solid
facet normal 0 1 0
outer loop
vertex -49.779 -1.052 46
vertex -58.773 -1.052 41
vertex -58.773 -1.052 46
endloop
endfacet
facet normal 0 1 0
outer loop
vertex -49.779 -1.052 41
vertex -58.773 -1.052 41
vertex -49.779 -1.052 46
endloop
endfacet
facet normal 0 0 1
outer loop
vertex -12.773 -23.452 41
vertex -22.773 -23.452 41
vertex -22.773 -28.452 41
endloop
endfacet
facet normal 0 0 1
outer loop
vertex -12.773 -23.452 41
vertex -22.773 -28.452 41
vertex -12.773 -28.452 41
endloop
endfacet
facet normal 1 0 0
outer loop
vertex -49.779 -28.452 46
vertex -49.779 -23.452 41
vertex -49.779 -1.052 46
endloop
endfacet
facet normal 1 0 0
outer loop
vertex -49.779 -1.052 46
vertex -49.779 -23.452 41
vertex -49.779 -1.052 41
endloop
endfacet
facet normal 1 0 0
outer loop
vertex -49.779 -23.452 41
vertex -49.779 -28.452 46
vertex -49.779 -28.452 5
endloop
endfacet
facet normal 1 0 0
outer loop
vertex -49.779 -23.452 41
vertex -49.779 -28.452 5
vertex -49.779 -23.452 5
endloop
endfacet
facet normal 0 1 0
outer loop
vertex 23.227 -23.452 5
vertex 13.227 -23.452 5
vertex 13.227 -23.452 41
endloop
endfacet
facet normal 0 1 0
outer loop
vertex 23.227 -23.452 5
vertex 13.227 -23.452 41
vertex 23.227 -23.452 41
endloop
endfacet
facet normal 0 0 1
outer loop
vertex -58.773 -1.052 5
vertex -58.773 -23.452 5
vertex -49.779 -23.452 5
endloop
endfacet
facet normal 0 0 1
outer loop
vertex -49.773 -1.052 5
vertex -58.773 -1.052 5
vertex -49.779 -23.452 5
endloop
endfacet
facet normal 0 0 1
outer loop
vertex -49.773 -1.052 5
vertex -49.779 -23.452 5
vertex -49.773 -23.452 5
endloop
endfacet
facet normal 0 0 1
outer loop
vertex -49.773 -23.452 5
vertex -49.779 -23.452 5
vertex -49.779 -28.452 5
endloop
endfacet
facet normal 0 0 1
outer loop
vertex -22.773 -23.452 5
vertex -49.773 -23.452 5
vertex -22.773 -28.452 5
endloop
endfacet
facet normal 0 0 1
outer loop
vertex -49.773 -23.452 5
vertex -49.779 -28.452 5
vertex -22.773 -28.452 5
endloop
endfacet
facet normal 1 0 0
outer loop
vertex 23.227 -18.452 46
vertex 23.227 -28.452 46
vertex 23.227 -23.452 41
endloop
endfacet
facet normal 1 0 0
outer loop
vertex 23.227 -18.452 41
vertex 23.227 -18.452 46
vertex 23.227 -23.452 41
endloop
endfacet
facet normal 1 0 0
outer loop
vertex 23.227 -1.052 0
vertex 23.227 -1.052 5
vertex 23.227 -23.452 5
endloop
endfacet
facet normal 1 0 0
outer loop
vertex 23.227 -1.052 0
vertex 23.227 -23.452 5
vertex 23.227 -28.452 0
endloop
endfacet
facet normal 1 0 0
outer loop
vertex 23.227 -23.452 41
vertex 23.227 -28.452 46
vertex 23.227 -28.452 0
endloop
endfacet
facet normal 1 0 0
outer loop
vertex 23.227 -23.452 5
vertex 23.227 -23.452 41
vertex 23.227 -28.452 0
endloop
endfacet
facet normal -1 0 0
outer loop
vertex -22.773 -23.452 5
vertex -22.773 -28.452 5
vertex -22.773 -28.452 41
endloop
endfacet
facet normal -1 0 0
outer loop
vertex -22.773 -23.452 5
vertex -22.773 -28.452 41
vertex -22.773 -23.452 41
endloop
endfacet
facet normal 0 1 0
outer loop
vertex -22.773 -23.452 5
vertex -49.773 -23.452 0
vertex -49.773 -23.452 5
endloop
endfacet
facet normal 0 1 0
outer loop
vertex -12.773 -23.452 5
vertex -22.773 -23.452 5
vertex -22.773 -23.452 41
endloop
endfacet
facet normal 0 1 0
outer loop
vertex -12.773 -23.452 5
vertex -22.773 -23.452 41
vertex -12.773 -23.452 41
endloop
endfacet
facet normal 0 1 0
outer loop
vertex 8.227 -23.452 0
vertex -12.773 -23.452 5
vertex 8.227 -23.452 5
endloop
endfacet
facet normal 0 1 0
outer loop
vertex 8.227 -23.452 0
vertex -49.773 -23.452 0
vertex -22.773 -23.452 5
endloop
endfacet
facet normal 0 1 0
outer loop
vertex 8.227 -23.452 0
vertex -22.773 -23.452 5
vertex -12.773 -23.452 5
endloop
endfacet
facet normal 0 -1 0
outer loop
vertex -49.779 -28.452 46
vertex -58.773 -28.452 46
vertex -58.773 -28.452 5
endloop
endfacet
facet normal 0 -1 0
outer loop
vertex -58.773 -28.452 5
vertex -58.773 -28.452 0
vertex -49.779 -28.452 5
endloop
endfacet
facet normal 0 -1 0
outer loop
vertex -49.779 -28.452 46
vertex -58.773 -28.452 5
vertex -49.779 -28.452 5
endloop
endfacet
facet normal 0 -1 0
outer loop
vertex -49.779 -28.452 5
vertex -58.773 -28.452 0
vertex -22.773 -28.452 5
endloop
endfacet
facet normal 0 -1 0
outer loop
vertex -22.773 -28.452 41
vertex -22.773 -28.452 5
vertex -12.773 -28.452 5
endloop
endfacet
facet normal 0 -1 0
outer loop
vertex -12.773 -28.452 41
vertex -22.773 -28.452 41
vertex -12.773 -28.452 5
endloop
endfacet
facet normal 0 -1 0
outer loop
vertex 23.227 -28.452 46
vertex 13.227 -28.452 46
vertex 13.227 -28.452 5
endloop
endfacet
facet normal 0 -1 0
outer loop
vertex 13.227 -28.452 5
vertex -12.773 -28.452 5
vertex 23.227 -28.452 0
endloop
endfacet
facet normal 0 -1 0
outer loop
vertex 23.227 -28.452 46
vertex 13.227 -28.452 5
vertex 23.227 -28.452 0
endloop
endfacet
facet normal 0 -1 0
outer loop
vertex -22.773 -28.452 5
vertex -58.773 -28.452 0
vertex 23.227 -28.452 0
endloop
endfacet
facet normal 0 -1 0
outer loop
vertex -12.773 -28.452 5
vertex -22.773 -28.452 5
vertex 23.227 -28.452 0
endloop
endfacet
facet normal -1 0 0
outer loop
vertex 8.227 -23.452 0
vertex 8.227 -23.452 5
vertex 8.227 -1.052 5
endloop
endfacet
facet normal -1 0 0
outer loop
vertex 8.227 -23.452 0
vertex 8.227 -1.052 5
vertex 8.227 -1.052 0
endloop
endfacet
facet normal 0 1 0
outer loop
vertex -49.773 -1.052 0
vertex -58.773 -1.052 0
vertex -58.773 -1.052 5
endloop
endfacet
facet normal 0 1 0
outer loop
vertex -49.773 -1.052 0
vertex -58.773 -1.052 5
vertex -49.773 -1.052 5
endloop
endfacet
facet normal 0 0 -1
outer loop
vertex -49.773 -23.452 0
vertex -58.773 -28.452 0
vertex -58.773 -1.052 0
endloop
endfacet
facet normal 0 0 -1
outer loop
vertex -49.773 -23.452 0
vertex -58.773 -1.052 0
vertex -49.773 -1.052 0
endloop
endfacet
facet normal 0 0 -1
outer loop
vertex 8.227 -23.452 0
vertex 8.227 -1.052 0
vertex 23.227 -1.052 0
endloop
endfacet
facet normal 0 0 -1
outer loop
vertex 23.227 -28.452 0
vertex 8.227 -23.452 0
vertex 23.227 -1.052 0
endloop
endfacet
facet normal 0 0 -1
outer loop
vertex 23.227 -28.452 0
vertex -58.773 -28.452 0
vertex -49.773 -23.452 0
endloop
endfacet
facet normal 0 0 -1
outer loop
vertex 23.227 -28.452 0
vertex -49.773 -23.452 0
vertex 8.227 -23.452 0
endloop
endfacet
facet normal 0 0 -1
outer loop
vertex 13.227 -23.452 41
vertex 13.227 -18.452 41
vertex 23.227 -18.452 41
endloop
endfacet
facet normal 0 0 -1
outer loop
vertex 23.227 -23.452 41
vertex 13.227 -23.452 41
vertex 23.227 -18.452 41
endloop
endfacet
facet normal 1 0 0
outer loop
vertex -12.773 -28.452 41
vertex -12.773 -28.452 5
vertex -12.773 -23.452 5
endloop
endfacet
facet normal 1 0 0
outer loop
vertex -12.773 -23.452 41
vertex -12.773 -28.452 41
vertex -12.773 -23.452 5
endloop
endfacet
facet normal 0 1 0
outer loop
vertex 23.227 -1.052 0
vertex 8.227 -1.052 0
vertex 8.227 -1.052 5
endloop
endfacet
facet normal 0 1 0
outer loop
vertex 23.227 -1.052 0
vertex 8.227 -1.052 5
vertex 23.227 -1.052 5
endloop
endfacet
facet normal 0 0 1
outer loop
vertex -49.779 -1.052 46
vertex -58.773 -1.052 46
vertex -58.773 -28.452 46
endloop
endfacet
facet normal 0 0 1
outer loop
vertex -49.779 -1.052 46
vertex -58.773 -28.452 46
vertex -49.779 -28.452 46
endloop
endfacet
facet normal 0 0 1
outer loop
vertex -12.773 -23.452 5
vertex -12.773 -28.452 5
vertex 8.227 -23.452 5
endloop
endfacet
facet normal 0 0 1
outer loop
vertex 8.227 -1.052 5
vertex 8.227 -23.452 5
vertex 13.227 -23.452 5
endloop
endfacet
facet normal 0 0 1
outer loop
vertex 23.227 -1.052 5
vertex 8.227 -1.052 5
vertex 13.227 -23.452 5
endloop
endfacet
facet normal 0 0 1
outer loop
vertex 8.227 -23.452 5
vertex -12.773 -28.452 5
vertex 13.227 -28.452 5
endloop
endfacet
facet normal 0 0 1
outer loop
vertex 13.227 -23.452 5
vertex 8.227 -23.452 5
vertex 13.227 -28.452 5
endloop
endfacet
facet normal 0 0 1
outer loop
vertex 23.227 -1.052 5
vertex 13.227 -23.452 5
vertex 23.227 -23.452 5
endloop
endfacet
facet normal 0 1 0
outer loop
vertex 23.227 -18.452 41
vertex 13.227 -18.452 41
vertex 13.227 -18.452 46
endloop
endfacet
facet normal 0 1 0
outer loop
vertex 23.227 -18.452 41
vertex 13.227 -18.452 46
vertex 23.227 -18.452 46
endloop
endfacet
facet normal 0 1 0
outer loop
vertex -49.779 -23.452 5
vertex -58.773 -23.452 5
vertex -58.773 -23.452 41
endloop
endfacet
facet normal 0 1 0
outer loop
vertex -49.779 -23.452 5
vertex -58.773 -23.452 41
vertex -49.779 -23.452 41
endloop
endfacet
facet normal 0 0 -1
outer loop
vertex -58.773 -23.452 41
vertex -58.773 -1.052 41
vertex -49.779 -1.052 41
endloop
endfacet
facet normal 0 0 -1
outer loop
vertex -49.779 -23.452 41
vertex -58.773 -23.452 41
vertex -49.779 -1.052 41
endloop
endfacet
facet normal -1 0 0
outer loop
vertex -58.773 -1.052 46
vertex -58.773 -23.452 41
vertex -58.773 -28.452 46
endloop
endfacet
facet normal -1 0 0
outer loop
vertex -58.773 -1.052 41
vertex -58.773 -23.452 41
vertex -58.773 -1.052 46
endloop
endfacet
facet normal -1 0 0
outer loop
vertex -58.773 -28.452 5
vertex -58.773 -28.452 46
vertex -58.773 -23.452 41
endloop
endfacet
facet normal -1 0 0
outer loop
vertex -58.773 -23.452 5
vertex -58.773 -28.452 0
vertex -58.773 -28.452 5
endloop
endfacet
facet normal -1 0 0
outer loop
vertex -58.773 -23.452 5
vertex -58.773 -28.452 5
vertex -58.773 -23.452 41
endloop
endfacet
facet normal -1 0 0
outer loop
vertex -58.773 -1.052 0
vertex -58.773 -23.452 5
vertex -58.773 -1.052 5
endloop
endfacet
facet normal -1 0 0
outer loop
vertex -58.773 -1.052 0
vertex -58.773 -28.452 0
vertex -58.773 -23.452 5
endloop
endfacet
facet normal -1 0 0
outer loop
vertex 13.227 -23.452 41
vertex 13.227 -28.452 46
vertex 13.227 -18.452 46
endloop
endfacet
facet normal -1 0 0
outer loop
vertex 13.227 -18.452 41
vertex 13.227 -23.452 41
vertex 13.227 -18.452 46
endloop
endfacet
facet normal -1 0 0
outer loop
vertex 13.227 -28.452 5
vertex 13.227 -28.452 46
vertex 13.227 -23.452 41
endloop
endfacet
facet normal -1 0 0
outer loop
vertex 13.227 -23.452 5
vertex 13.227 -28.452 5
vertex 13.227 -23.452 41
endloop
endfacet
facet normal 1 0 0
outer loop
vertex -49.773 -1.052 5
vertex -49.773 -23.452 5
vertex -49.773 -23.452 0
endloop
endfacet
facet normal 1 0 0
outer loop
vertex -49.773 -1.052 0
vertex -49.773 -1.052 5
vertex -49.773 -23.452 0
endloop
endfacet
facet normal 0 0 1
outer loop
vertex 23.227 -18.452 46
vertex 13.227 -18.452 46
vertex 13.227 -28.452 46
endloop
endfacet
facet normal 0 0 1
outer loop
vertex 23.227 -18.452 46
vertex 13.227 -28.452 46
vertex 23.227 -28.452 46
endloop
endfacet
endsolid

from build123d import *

# Parameters (mm, degrees)
CROQUIS1_W              = 82
CROQUIS1_H              = 5
SALIENTE_EXTRUIR1_DEPTH = 5
CROQUIS2_W              = 15
CROQUIS2_H              = 5
CROQUIS2_W_2            = 9
SALIENTE_EXTRUIR2_DEPTH = 22.4
CROQUIS3_W              = 8.993517989
CROQUIS3_H              = 5
CROQUIS3_W_2            = 10
SALIENTE_EXTRUIR3_DEPTH = 36
CROQUIS4_W              = 8.993517989
CROQUIS4_H              = 27.4
CROQUIS4_W_2            = 10
CROQUIS4_H_2            = 10
SALIENTE_EXTRUIR4_DEPTH = 5


with BuildPart() as part:
    # Croquis1 → Saliente-Extruir1 (new body)
    with BuildSketch(Plane.XY):
        with Locations((-17.772529993, -25.951946472)):
            Rectangle(CROQUIS1_W, CROQUIS1_H)
    extrude(amount=SALIENTE_EXTRUIR1_DEPTH)

    # Croquis2 → Saliente-Extruir2 (add)
    with BuildSketch(Plane(origin=(0, -23.451946472, 0), x_dir=(1, 0, 0), z_dir=(0, 1, 0))):
        with Locations((15.727470007, -2.5)):
            Rectangle(CROQUIS2_W, CROQUIS2_H)
        with Locations((-54.272529993, -2.5)):
            Rectangle(CROQUIS2_W_2, CROQUIS2_H)
    extrude(amount=SALIENTE_EXTRUIR2_DEPTH)

    # Croquis3 → Saliente-Extruir3 (add)
    with BuildSketch(Plane.XY.offset(5)):
        with Locations((-54.275770999, -25.951946472)):
            Rectangle(CROQUIS3_W, CROQUIS3_H)
        with Locations((-17.772529993, -25.951946472)):
            Rectangle(CROQUIS3_W_2, CROQUIS3_H)
        with Locations((18.227470007, -25.951946472)):
            Rectangle(CROQUIS3_W_2, CROQUIS3_H)
    extrude(amount=SALIENTE_EXTRUIR3_DEPTH)

    # Croquis4 → Saliente-Extruir4 (add)
    with BuildSketch(Plane.XY.offset(41)):
        with Locations((-54.275770999, -14.751946472)):
            Rectangle(CROQUIS4_W, CROQUIS4_H)
        with Locations((18.227470007, -23.451946472)):
            Rectangle(CROQUIS4_W_2, CROQUIS4_H_2)
    extrude(amount=SALIENTE_EXTRUIR4_DEPTH)


solid = part.part
